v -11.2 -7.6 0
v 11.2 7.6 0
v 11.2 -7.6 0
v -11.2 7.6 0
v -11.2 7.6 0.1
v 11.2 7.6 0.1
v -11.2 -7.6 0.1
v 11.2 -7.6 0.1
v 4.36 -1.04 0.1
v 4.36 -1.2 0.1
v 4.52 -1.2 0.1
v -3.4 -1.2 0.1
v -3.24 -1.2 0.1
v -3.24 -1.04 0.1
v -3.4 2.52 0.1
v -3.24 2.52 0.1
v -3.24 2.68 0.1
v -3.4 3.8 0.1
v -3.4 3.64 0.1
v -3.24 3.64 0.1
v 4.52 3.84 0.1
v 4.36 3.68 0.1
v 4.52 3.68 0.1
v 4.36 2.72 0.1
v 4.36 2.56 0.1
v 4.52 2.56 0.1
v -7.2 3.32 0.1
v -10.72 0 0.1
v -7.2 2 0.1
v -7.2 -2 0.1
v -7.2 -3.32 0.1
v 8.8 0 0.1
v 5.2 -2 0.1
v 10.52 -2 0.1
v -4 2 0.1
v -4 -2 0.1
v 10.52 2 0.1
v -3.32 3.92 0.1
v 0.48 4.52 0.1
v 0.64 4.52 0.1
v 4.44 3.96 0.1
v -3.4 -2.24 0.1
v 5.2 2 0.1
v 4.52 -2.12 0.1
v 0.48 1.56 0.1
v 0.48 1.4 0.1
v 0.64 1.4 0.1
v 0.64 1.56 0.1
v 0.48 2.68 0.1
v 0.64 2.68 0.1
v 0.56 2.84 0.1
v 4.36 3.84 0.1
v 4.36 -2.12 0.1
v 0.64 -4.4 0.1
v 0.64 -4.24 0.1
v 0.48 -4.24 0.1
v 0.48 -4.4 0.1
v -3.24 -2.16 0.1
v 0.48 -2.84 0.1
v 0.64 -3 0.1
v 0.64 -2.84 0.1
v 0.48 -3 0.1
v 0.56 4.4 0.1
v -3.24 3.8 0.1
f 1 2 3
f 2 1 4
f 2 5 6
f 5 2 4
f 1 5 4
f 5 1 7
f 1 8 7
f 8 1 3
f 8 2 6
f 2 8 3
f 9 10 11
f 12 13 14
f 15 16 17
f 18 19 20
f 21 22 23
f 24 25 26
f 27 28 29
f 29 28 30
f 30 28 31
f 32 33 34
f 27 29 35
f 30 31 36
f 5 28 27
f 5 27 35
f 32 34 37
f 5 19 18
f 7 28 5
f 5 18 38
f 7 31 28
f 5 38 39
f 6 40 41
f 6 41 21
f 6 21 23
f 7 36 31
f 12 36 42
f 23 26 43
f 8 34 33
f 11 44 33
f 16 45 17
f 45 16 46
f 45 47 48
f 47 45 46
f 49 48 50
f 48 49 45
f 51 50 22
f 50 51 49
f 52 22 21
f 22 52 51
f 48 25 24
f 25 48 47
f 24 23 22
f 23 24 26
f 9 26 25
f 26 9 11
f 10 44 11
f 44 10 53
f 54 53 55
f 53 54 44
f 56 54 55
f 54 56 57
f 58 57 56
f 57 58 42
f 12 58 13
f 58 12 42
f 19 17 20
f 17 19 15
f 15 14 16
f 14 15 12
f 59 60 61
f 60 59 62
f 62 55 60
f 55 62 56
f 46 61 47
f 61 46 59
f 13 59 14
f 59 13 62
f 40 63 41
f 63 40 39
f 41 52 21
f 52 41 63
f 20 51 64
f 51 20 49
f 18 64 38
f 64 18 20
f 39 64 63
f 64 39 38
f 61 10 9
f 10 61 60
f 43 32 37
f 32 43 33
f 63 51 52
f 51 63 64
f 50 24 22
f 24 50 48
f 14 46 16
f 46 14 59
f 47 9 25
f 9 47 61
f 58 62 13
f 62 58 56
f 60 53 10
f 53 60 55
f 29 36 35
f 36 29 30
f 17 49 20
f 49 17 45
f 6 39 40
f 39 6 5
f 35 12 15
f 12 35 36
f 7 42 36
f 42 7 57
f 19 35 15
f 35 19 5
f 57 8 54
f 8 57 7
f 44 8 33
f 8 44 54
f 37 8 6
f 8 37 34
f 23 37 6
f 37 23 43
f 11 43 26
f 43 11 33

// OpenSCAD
// file: ../p/4-4edge.scad
use <../lib.scad>
$fa=1; $fs=0.2;
function ldraw_lib__4_4edge(realsolid=false) = [
// 0 Circle 1.0
// 0 Name: 4-4edge.dat
// 0 Author: James Jessiman
// 0 !LDRAW_ORG Primitive UPDATE 2017-01
// 0 !LICENSE Licensed under CC BY 2.0 and CC BY 4.0 : see CAreadme.txt
// 
// 0 BFC CERTIFY CCW
  [0,"BFC","CERTIFY"],
  [0,"BFC","CCW"],
// 
// 0 !HISTORY 1998-12-15 [PTadmin] Official Update 1998-10
// 0 !HISTORY 2005-12-28 [PTadmin] Official Update 2005-01
// 0 !HISTORY 2007-06-24 [PTadmin] Header formatted for Contributor Agreement
// 0 !HISTORY 2008-07-01 [PTadmin] Official Update 2008-01
// 0 !HISTORY 2017-01-15 [Steffen] BFCed
// 0 !HISTORY 2017-12-30 [PTadmin] Official Update 2017-01
// 
// 
// 2 24 1 0 0 0.9239 0 0.3827
  [2,24,1,0,0,0.9239,0,0.3827],
// 2 24 0.9239 0 0.3827 0.7071 0 0.7071
  [2,24,0.9239,0,0.3827,0.7071,0,0.7071],
// 2 24 0.7071 0 0.7071 0.3827 0 0.9239
  [2,24,0.7071,0,0.7071,0.3827,0,0.9239],
// 2 24 0.3827 0 0.9239 0 0 1
  [2,24,0.3827,0,0.9239,0,0,1],
// 2 24 0 0 1 -0.3827 0 0.9239
  [2,24,0,0,1,-0.3827,0,0.9239],
// 2 24 -0.3827 0 0.9239 -0.7071 0 0.7071
  [2,24,-0.3827,0,0.9239,-0.7071,0,0.7071],
// 2 24 -0.7071 0 0.7071 -0.9239 0 0.3827
  [2,24,-0.7071,0,0.7071,-0.9239,0,0.3827],
// 2 24 -0.9239 0 0.3827 -1 0 -0
  [2,24,-0.9239,0,0.3827,-1,0,-0],
// 2 24 -1 0 -0 -0.9239 0 -0.3827
  [2,24,-1,0,-0,-0.9239,0,-0.3827],
// 2 24 -0.9239 0 -0.3827 -0.7071 0 -0.7071
  [2,24,-0.9239,0,-0.3827,-0.7071,0,-0.7071],
// 2 24 -0.7071 0 -0.7071 -0.3827 0 -0.9239
  [2,24,-0.7071,0,-0.7071,-0.3827,0,-0.9239],
// 2 24 -0.3827 0 -0.9239 0 0 -1
  [2,24,-0.3827,0,-0.9239,0,0,-1],
// 2 24 0 0 -1 0.3827 0 -0.9239
  [2,24,0,0,-1,0.3827,0,-0.9239],
// 2 24 0.3827 0 -0.9239 0.7071 0 -0.7071
  [2,24,0.3827,0,-0.9239,0.7071,0,-0.7071],
// 2 24 0.7071 0 -0.7071 0.9239 0 -0.3827
  [2,24,0.7071,0,-0.7071,0.9239,0,-0.3827],
// 2 24 0.9239 0 -0.3827 1 0 0
  [2,24,0.9239,0,-0.3827,1,0,0],
];
module ldraw_lib__4_4edge(step=0, col=false, unit=2/5, alt=false, line=0.2, solid=!$preview)
    makepoly(ldraw_lib__4_4edge(solid), step=step, col=col, unit=unit, alt=alt, line=line, solid=solid);
ldraw_lib__4_4edge(line=0.2);
// file: ../p/4-4disc.scad
use <../lib.scad>
$fa=1; $fs=0.2;
function ldraw_lib__4_4disc(realsolid=false) = [
// 0 Disc 1.0
// 0 Name: 4-4disc.dat
// 0 Author: James Jessiman
// 0 !LDRAW_ORG Primitive UPDATE 2002-02
// 0 !LICENSE Licensed under CC BY 2.0 and CC BY 4.0 : see CAreadme.txt
// 
// 0 BFC CERTIFY CCW
  [0,"BFC","CERTIFY"],
  [0,"BFC","CCW"],
// 
// 0 !HISTORY 1998-12-15 [PTadmin] Official Update 1998-10
// 0 !HISTORY 2002-03-23 [sbliss] Added BFC statement
// 0 !HISTORY 2002-04-25 [PTadmin] Official Update 2002-02
// 0 !HISTORY 2007-06-24 [PTadmin] Header formatted for Contributor Agreement
// 0 !HISTORY 2008-07-01 [PTadmin] Official Update 2008-01
// 
// 
// 3 16 0 0 0 1 0 0 0.9239 0 0.3827
  [3,16,0,0,0,1,0,0,0.9239,0,0.3827],
// 3 16 0 0 0 0.9239 0 0.3827 0.7071 0 0.7071
  [3,16,0,0,0,0.9239,0,0.3827,0.7071,0,0.7071],
// 3 16 0 0 0 0.7071 0 0.7071 0.3827 0 0.9239
  [3,16,0,0,0,0.7071,0,0.7071,0.3827,0,0.9239],
// 3 16 0 0 0 0.3827 0 0.9239 0 0 1
  [3,16,0,0,0,0.3827,0,0.9239,0,0,1],
// 3 16 0 0 0 0 0 1 -0.3827 0 0.9239
  [3,16,0,0,0,0,0,1,-0.3827,0,0.9239],
// 3 16 0 0 0 -0.3827 0 0.9239 -0.7071 0 0.7071
  [3,16,0,0,0,-0.3827,0,0.9239,-0.7071,0,0.7071],
// 3 16 0 0 0 -0.7071 0 0.7071 -0.9239 0 0.3827
  [3,16,0,0,0,-0.7071,0,0.7071,-0.9239,0,0.3827],
// 3 16 0 0 0 -0.9239 0 0.3827 -1 0 -0
  [3,16,0,0,0,-0.9239,0,0.3827,-1,0,-0],
// 3 16 0 0 0 -1 0 -0 -0.9239 0 -0.3827
  [3,16,0,0,0,-1,0,-0,-0.9239,0,-0.3827],
// 3 16 0 0 0 -0.9239 0 -0.3827 -0.7071 0 -0.7071
  [3,16,0,0,0,-0.9239,0,-0.3827,-0.7071,0,-0.7071],
// 3 16 0 0 0 -0.7071 0 -0.7071 -0.3827 0 -0.9239
  [3,16,0,0,0,-0.7071,0,-0.7071,-0.3827,0,-0.9239],
// 3 16 0 0 0 -0.3827 0 -0.9239 0 0 -1
  [3,16,0,0,0,-0.3827,0,-0.9239,0,0,-1],
// 3 16 0 0 0 0 0 -1 0.3827 0 -0.9239
  [3,16,0,0,0,0,0,-1,0.3827,0,-0.9239],
// 3 16 0 0 0 0.3827 0 -0.9239 0.7071 0 -0.7071
  [3,16,0,0,0,0.3827,0,-0.9239,0.7071,0,-0.7071],
// 3 16 0 0 0 0.7071 0 -0.7071 0.9239 0 -0.3827
  [3,16,0,0,0,0.7071,0,-0.7071,0.9239,0,-0.3827],
// 3 16 0 0 0 0.9239 0 -0.3827 1 0 0
  [3,16,0,0,0,0.9239,0,-0.3827,1,0,0],
// 0
];
module ldraw_lib__4_4disc(step=0, col=false, unit=2/5, alt=false, line=0.2, solid=!$preview)
    makepoly(ldraw_lib__4_4disc(solid), step=step, col=col, unit=unit, alt=alt, line=line, solid=solid);
ldraw_lib__4_4disc(line=0.2);
// file: ../p/4-4cyli.scad
use <../lib.scad>
$fa=1; $fs=0.2;
function ldraw_lib__4_4cyli(realsolid=false) = [
// 0 Cylinder 1.0
// 0 Name: 4-4cyli.dat
// 0 Author: James Jessiman
// 0 !LDRAW_ORG Primitive UPDATE 2005-01
// 0 !LICENSE Licensed under CC BY 2.0 and CC BY 4.0 : see CAreadme.txt
// 
// 0 BFC CERTIFY CCW
  [0,"BFC","CERTIFY"],
  [0,"BFC","CCW"],
// 
// 0 !HISTORY 1998-12-15 [PTadmin] Official Update 1998-10
// 0 !HISTORY 2002-03-23 [sbliss] Added BFC statement; merged headers from files in distributions LDraw 0.27 and Complete.
// 0 !HISTORY 2002-04-25 [PTadmin] Official Update 2002-02
// 0 !HISTORY 2004-12-14 [guyvivan] BFC CCW
// 0 !HISTORY 2005-12-28 [PTadmin] Official Update 2005-01
// 0 !HISTORY 2007-06-24 [PTadmin] Header formatted for Contributor Agreement
// 0 !HISTORY 2008-07-01 [PTadmin] Official Update 2008-01
// 
// 
// 4 16 1 1 0 0.9239 1 0.3827 0.9239 0 0.3827 1 0 0
  [4,16,1,1,0,0.9239,1,0.3827,0.9239,0,0.3827,1,0,0],
// 5 24 1 0 0 1 1 0 0.9239 0 0.3827 0.9239 0 -0.3827
  [5,24,1,0,0,1,1,0,0.9239,0,0.3827,0.9239,0,-0.3827],
// 4 16 0.9239 1 0.3827 0.7071 1 0.7071 0.7071 0 0.7071 0.9239 0 0.3827
  [4,16,0.9239,1,0.3827,0.7071,1,0.7071,0.7071,0,0.7071,0.9239,0,0.3827],
// 5 24 0.9239 0 0.3827 0.9239 1 0.3827 0.7071 0 0.7071 1 0 0
  [5,24,0.9239,0,0.3827,0.9239,1,0.3827,0.7071,0,0.7071,1,0,0],
// 4 16 0.7071 1 0.7071 0.3827 1 0.9239 0.3827 0 0.9239 0.7071 0 0.7071
  [4,16,0.7071,1,0.7071,0.3827,1,0.9239,0.3827,0,0.9239,0.7071,0,0.7071],
// 5 24 0.7071 0 0.7071 0.7071 1 0.7071 0.3827 0 0.9239 0.9239 0 0.3827
  [5,24,0.7071,0,0.7071,0.7071,1,0.7071,0.3827,0,0.9239,0.9239,0,0.3827],
// 4 16 0.3827 1 0.9239 0 1 1 0 0 1 0.3827 0 0.9239
  [4,16,0.3827,1,0.9239,0,1,1,0,0,1,0.3827,0,0.9239],
// 5 24 0.3827 0 0.9239 0.3827 1 0.9239 0 0 1 0.7071 0 0.7071
  [5,24,0.3827,0,0.9239,0.3827,1,0.9239,0,0,1,0.7071,0,0.7071],
// 4 16 0 1 1 -0.3827 1 0.9239 -0.3827 0 0.9239 0 0 1
  [4,16,0,1,1,-0.3827,1,0.9239,-0.3827,0,0.9239,0,0,1],
// 5 24 0 0 1 0 1 1 -0.3827 0 0.9239 0.3827 0 0.9239
  [5,24,0,0,1,0,1,1,-0.3827,0,0.9239,0.3827,0,0.9239],
// 4 16 -0.3827 1 0.9239 -0.7071 1 0.7071 -0.7071 0 0.7071 -0.3827 0 0.9239
  [4,16,-0.3827,1,0.9239,-0.7071,1,0.7071,-0.7071,0,0.7071,-0.3827,0,0.9239],
// 5 24 -0.3827 0 0.9239 -0.3827 1 0.9239 -0.7071 0 0.7071 0 0 1
  [5,24,-0.3827,0,0.9239,-0.3827,1,0.9239,-0.7071,0,0.7071,0,0,1],
// 4 16 -0.7071 1 0.7071 -0.9239 1 0.3827 -0.9239 0 0.3827 -0.7071 0 0.7071
  [4,16,-0.7071,1,0.7071,-0.9239,1,0.3827,-0.9239,0,0.3827,-0.7071,0,0.7071],
// 5 24 -0.7071 0 0.7071 -0.7071 1 0.7071 -0.9239 0 0.3827 -0.3827 0 0.9239
  [5,24,-0.7071,0,0.7071,-0.7071,1,0.7071,-0.9239,0,0.3827,-0.3827,0,0.9239],
// 4 16 -0.9239 1 0.3827 -1 1 0 -1 0 0 -0.9239 0 0.3827
  [4,16,-0.9239,1,0.3827,-1,1,0,-1,0,0,-0.9239,0,0.3827],
// 5 24 -0.9239 0 0.3827 -0.9239 1 0.3827 -1 0 0 -0.7071 0 0.7071
  [5,24,-0.9239,0,0.3827,-0.9239,1,0.3827,-1,0,0,-0.7071,0,0.7071],
// 4 16 -1 1 0 -0.9239 1 -0.3827 -0.9239 0 -0.3827 -1 0 0
  [4,16,-1,1,0,-0.9239,1,-0.3827,-0.9239,0,-0.3827,-1,0,0],
// 5 24 -1 0 0 -1 1 0 -0.9239 0 -0.3827 -0.9239 0 0.3827
  [5,24,-1,0,0,-1,1,0,-0.9239,0,-0.3827,-0.9239,0,0.3827],
// 4 16 -0.9239 1 -0.3827 -0.7071 1 -0.7071 -0.7071 0 -0.7071 -0.9239 0 -0.3827
  [4,16,-0.9239,1,-0.3827,-0.7071,1,-0.7071,-0.7071,0,-0.7071,-0.9239,0,-0.3827],
// 5 24 -0.9239 0 -0.3827 -0.9239 1 -0.3827 -0.7071 0 -0.7071 -1 0 0
  [5,24,-0.9239,0,-0.3827,-0.9239,1,-0.3827,-0.7071,0,-0.7071,-1,0,0],
// 4 16 -0.7071 1 -0.7071 -0.3827 1 -0.9239 -0.3827 0 -0.9239 -0.7071 0 -0.7071
  [4,16,-0.7071,1,-0.7071,-0.3827,1,-0.9239,-0.3827,0,-0.9239,-0.7071,0,-0.7071],
// 5 24 -0.7071 0 -0.7071 -0.7071 1 -0.7071 -0.3827 0 -0.9239 -0.9239 0 -0.3827
  [5,24,-0.7071,0,-0.7071,-0.7071,1,-0.7071,-0.3827,0,-0.9239,-0.9239,0,-0.3827],
// 4 16 -0.3827 1 -0.9239 0 1 -1 0 0 -1 -0.3827 0 -0.9239
  [4,16,-0.3827,1,-0.9239,0,1,-1,0,0,-1,-0.3827,0,-0.9239],
// 5 24 -0.3827 0 -0.9239 -0.3827 1 -0.9239 0 0 -1 -0.7071 0 -0.7071
  [5,24,-0.3827,0,-0.9239,-0.3827,1,-0.9239,0,0,-1,-0.7071,0,-0.7071],
// 4 16 0 1 -1 0.3827 1 -0.9239 0.3827 0 -0.9239 0 0 -1
  [4,16,0,1,-1,0.3827,1,-0.9239,0.3827,0,-0.9239,0,0,-1],
// 5 24 0 0 -1 0 1 -1 0.3827 0 -0.9239 -0.3827 0 -0.9239
  [5,24,0,0,-1,0,1,-1,0.3827,0,-0.9239,-0.3827,0,-0.9239],
// 4 16 0.3827 1 -0.9239 0.7071 1 -0.7071 0.7071 0 -0.7071 0.3827 0 -0.9239
  [4,16,0.3827,1,-0.9239,0.7071,1,-0.7071,0.7071,0,-0.7071,0.3827,0,-0.9239],
// 5 24 0.3827 0 -0.9239 0.3827 1 -0.9239 0.7071 0 -0.7071 0 0 -1
  [5,24,0.3827,0,-0.9239,0.3827,1,-0.9239,0.7071,0,-0.7071,0,0,-1],
// 4 16 0.7071 1 -0.7071 0.9239 1 -0.3827 0.9239 0 -0.3827 0.7071 0 -0.7071
  [4,16,0.7071,1,-0.7071,0.9239,1,-0.3827,0.9239,0,-0.3827,0.7071,0,-0.7071],
// 5 24 0.7071 0 -0.7071 0.7071 1 -0.7071 0.9239 0 -0.3827 0.3827 0 -0.9239
  [5,24,0.7071,0,-0.7071,0.7071,1,-0.7071,0.9239,0,-0.3827,0.3827,0,-0.9239],
// 4 16 0.9239 1 -0.3827 1 1 0 1 0 0 0.9239 0 -0.3827
  [4,16,0.9239,1,-0.3827,1,1,0,1,0,0,0.9239,0,-0.3827],
// 5 24 0.9239 0 -0.3827 0.9239 1 -0.3827 1 0 0 0.7071 0 -0.7071
  [5,24,0.9239,0,-0.3827,0.9239,1,-0.3827,1,0,0,0.7071,0,-0.7071],
// 0
];
module ldraw_lib__4_4cyli(step=0, col=false, unit=2/5, alt=false, line=0.2, solid=!$preview)
    makepoly(ldraw_lib__4_4cyli(solid), step=step, col=col, unit=unit, alt=alt, line=line, solid=solid);
ldraw_lib__4_4cyli(line=0.2);
// file: ../p/stud3.scad
use <../lib.scad>
use <4-4cyli.scad>
use <4-4disc.scad>
use <4-4edge.scad>
$fa=1; $fs=0.2;
function ldraw_lib__stud3(realsolid=false) = realsolid ? 
    [openscad(translate([0,0,-eps()], o=cylinder(4+eps(), r=4)),2)] : [
// 0 Stud Tube Solid
// 0 Name: stud3.dat
// 0 Author: James Jessiman
// 0 !LDRAW_ORG Primitive UPDATE 2012-01
// 0 !LICENSE Licensed under CC BY 2.0 and CC BY 4.0 : see CAreadme.txt
// 
// 0 BFC CERTIFY CCW
  [0,"BFC","CERTIFY"],
  [0,"BFC","CCW"],
// 
// 0 !HISTORY 2002-04-04 [sbliss] Modified for BFC compliance
// 0 !HISTORY 2002-04-25 [PTadmin] Official Update 2002-02
// 0 !HISTORY 2007-06-24 [PTadmin] Header formatted for Contributor Agreement
// 0 !HISTORY 2008-07-01 [PTadmin] Official Update 2008-01
// 0 !HISTORY 2012-02-16 [Philo] Changed to CCW
// 0 !HISTORY 2012-03-30 [PTadmin] Official Update 2012-01
// 
// 
// 1 16 0 -4 0 4 0 0 0 1 0 0 0 4 4-4edge.dat
  [1,16,0,-4,0,4,0,0,0,1,0,0,0,4, ldraw_lib__4_4edge(realsolid)],
// 1 16 0 0 0 4 0 0 0 1 0 0 0 4 4-4edge.dat
  [1,16,0,0,0,4,0,0,0,1,0,0,0,4, ldraw_lib__4_4edge(realsolid)],
// 1 16 0 -4 0 4 0 0 0 1 0 0 0 4 4-4disc.dat
  [1,16,0,-4,0,4,0,0,0,1,0,0,0,4, ldraw_lib__4_4disc(realsolid)],
// 1 16 0 -4 0 4 0 0 0 4 0 0 0 4 4-4cyli.dat
  [1,16,0,-4,0,4,0,0,0,4,0,0,0,4, ldraw_lib__4_4cyli(realsolid)],
];
module ldraw_lib__stud3(step=0, col=false, unit=2/5, alt=false, line=0.2, solid=!$preview)
    makepoly(ldraw_lib__stud3(solid), step=step, col=col, unit=unit, alt=alt, line=line, solid=solid);
ldraw_lib__stud3(line=0.2);
// file: ../p/stud.scad
use <../lib.scad>
use <4-4cyli.scad>
use <4-4disc.scad>
use <4-4edge.scad>
$fa=1; $fs=0.2;
function ldraw_lib__stud(realsolid=false) = realsolid ? 
    [openscad(translate([0,0,-eps()], o=cylinder(4+eps(), r=6)),2)] : [
// 0 Stud
// 0 Name: stud.dat
// 0 Author: James Jessiman
// 0 !LDRAW_ORG Primitive UPDATE 2012-01
// 0 !LICENSE Licensed under CC BY 2.0 and CC BY 4.0 : see CAreadme.txt
// 
// 0 BFC CERTIFY CCW
  [0,"BFC","CERTIFY"],
  [0,"BFC","CCW"],
// 
// 0 !HISTORY 2002-04-04 [sbliss] Modified for BFC compliance
// 0 !HISTORY 2002-04-25 [PTadmin] Official Update 2002-02
// 0 !HISTORY 2007-06-24 [PTadmin] Header formatted for Contributor Agreement
// 0 !HISTORY 2008-07-01 [PTadmin] Official Update 2008-01
// 0 !HISTORY 2012-02-16 [Philo] Changed to CCW
// 0 !HISTORY 2012-03-30 [PTadmin] Official Update 2012-01
// 
// 
// 1 16 0 0 0 6 0 0 0 1 0 0 0 6 4-4edge.dat
  [1,16,0,0,0,6,0,0,0,1,0,0,0,6, ldraw_lib__4_4edge(realsolid)],
// 1 16 0 -4 0 6 0 0 0 1 0 0 0 6 4-4edge.dat
  [1,16,0,-4,0,6,0,0,0,1,0,0,0,6, ldraw_lib__4_4edge(realsolid)],
// 1 16 0 0 0 6 0 0 0 -4 0 0 0 6 4-4cyli.dat
  [1,16,0,0,0,6,0,0,0,-4,0,0,0,6, ldraw_lib__4_4cyli(realsolid)],
// 1 16 0 -4 0 6 0 0 0 1 0 0 0 6 4-4disc.dat
  [1,16,0,-4,0,6,0,0,0,1,0,0,0,6, ldraw_lib__4_4disc(realsolid)],
];
module ldraw_lib__stud(step=0, col=false, unit=2/5, alt=false, line=0.2, solid=!$preview)
    makepoly(ldraw_lib__stud(solid), step=step, col=col, unit=unit, alt=alt, line=line, solid=solid);
ldraw_lib__stud(line=0.2);
// file: ../p/box5.scad
use <../lib.scad>
$fa=1; $fs=0.2;
function ldraw_lib__box5(realsolid=false) = [
// 0 Box with 5 Faces and All Edges
// 0 Name: box5.dat
// 0 Author: James Jessiman
// 0 !LDRAW_ORG Primitive UPDATE 2012-01
// 0 !LICENSE Licensed under CC BY 2.0 and CC BY 4.0 : see CAreadme.txt
// 
// 0 BFC CERTIFY CCW
  [0,"BFC","CERTIFY"],
  [0,"BFC","CCW"],
// 
// 0 !HISTORY 2002-04-03 [sbliss] Modified for BFC compliance
// 0 !HISTORY 2002-04-25 [PTadmin] Official Update 2002-02
// 0 !HISTORY 2007-06-24 [PTadmin] Header formatted for Contributor Agreement
// 0 !HISTORY 2008-07-01 [PTadmin] Official Update 2008-01
// 0 !HISTORY 2012-02-16 [Philo] Changed to CCW
// 0 !HISTORY 2012-03-30 [PTadmin] Official Update 2012-01
// 
// 
// 2 24 1 1 1 -1 1 1
  [2,24,1,1,1,-1,1,1],
// 2 24 -1 1 1 -1 1 -1
  [2,24,-1,1,1,-1,1,-1],
// 2 24 -1 1 -1 1 1 -1
  [2,24,-1,1,-1,1,1,-1],
// 2 24 1 1 -1 1 1 1
  [2,24,1,1,-1,1,1,1],
// 2 24 1 0 1 -1 0 1
  [2,24,1,0,1,-1,0,1],
// 2 24 -1 0 1 -1 0 -1
  [2,24,-1,0,1,-1,0,-1],
// 2 24 -1 0 -1 1 0 -1
  [2,24,-1,0,-1,1,0,-1],
// 2 24 1 0 -1 1 0 1
  [2,24,1,0,-1,1,0,1],
// 2 24 1 0 1 1 1 1
  [2,24,1,0,1,1,1,1],
// 2 24 -1 0 1 -1 1 1
  [2,24,-1,0,1,-1,1,1],
// 2 24 1 0 -1 1 1 -1
  [2,24,1,0,-1,1,1,-1],
// 2 24 -1 0 -1 -1 1 -1
  [2,24,-1,0,-1,-1,1,-1],
// 4 16 -1 1 1 1 1 1 1 1 -1 -1 1 -1
  [4,16,-1,1,1,1,1,1,1,1,-1,-1,1,-1],
// 4 16 -1 1 1 -1 0 1 1 0 1 1 1 1
  [4,16,-1,1,1,-1,0,1,1,0,1,1,1,1],
// 4 16 -1 1 -1 -1 0 -1 -1 0 1 -1 1 1
  [4,16,-1,1,-1,-1,0,-1,-1,0,1,-1,1,1],
// 4 16 1 1 -1 1 0 -1 -1 0 -1 -1 1 -1
  [4,16,1,1,-1,1,0,-1,-1,0,-1,-1,1,-1],
// 4 16 1 1 1 1 0 1 1 0 -1 1 1 -1
  [4,16,1,1,1,1,0,1,1,0,-1,1,1,-1],
];
module ldraw_lib__box5(step=0, col=false, unit=2/5, alt=false, line=0.2, solid=!$preview)
    makepoly(ldraw_lib__box5(solid), step=step, col=col, unit=unit, alt=alt, line=line, solid=solid);
ldraw_lib__box5(line=0.2);
// file: ../p/box4t.scad
use <../lib.scad>
$fa=1; $fs=0.2;
function ldraw_lib__box4t(realsolid=false) = [
// 0 Box with 4 Adjacent Faces and All Edges
// 0 Name: box4t.dat
// 0 Author: Tore Eriksson [Tore_Eriksson]
// 0 !LDRAW_ORG Primitive UPDATE 2003-02
// 0 !LICENSE Licensed under CC BY 2.0 and CC BY 4.0 : see CAreadme.txt
// 
// 0 BFC CERTIFY CCW
  [0,"BFC","CERTIFY"],
  [0,"BFC","CCW"],
// 
// 0 !HISTORY 1997-09-29 [PTadmin] Official Update 1997-15
// 0 !HISTORY 2002-08-31 [izanette] Modified with WINDZ for BFC compliance
// 0 !HISTORY 2003-08-01 [PTadmin] Official Update 2003-02
// 0 !HISTORY 2007-06-24 [PTadmin] Header formatted for Contributor Agreement
// 0 !HISTORY 2008-07-01 [PTadmin] Official Update 2008-01
// 
// 
// 2 24 1 1 1 -1 1 1
  [2,24,1,1,1,-1,1,1],
// 2 24 -1 1 1 -1 1 -1
  [2,24,-1,1,1,-1,1,-1],
// 2 24 -1 1 -1 1 1 -1
  [2,24,-1,1,-1,1,1,-1],
// 2 24 1 1 -1 1 1 1
  [2,24,1,1,-1,1,1,1],
// 2 24 1 0 1 -1 0 1
  [2,24,1,0,1,-1,0,1],
// 2 24 -1 0 1 -1 0 -1
  [2,24,-1,0,1,-1,0,-1],
// 2 24 -1 0 -1 1 0 -1
  [2,24,-1,0,-1,1,0,-1],
// 2 24 1 0 -1 1 0 1
  [2,24,1,0,-1,1,0,1],
// 2 24 1 0 1 1 1 1
  [2,24,1,0,1,1,1,1],
// 2 24 -1 0 1 -1 1 1
  [2,24,-1,0,1,-1,1,1],
// 2 24 1 0 -1 1 1 -1
  [2,24,1,0,-1,1,1,-1],
// 2 24 -1 0 -1 -1 1 -1
  [2,24,-1,0,-1,-1,1,-1],
// 4 16 1 1 1 1 1 -1 -1 1 -1 -1 1 1
  [4,16,1,1,1,1,1,-1,-1,1,-1,-1,1,1],
// 4 16 1 1 1 -1 1 1 -1 0 1 1 0 1
  [4,16,1,1,1,-1,1,1,-1,0,1,1,0,1],
// 4 16 -1 1 1 -1 1 -1 -1 0 -1 -1 0 1
  [4,16,-1,1,1,-1,1,-1,-1,0,-1,-1,0,1],
// 0 4 16 -1 1 -1 -1 0 -1 1 0 -1 1 1 -1
// 4 16 1 1 -1 1 1 1 1 0 1 1 0 -1
  [4,16,1,1,-1,1,1,1,1,0,1,1,0,-1],
// 0
];
module ldraw_lib__box4t(step=0, col=false, unit=2/5, alt=false, line=0.2, solid=!$preview)
    makepoly(ldraw_lib__box4t(solid), step=step, col=col, unit=unit, alt=alt, line=line, solid=solid);
ldraw_lib__box4t(line=0.2);
// file: s/3004s01.scad
use <../../lib.scad>
use <../../p/box4t.scad>
use <../../p/box5.scad>
use <../../p/stud.scad>
use <../../p/stud3.scad>
$fa=1; $fs=0.2;
function ldraw_lib__s__3004s01(realsolid=false) = [
// 0 ~Brick  1 x  2 without Front Face
// 0 Name: s\3004s01.dat
// 0 Author: James Jessiman
// 0 !LDRAW_ORG Subpart UPDATE 2003-03
// 0 !LICENSE Licensed under CC BY 2.0 and CC BY 4.0 : see CAreadme.txt
// 
// 0 BFC CERTIFY CCW
  [0,"BFC","CERTIFY"],
  [0,"BFC","CCW"],
// 
// 0 !HISTORY 2003-09-07 [jriley] Subfiling, BFC
// 0 !HISTORY 2003-12-19 [PTadmin] Official Update 2003-03
// 0 !HISTORY 2007-08-29 [PTadmin] Header formatted for Contributor Agreement
// 0 !HISTORY 2008-07-01 [PTadmin] Official Update 2008-01
// 
// 
// 1 16 0 4 0 1 0 0 0 -5 0 0 0 1 stud3.dat
  [1,16,0,4,0,1,0,0,0,-5,0,0,0,1, ldraw_lib__stud3(realsolid)],
// 0 BFC INVERTNEXT
  [0,"BFC","INVERTNEXT"],
// 1 16 0 24 0 16 0 0 0 -20 0 0 0 6 box5.dat
  [1,16,0,24,0,16,0,0,0,-20,0,0,0,6, ldraw_lib__box5(realsolid)],
// 4 16 20 24 10 16 24 6 -16 24 6 -20 24 10
  [4,16,20,24,10,16,24,6,-16,24,6,-20,24,10],
// 4 16 -20 24 10 -16 24 6 -16 24 -6 -20 24 -10
  [4,16,-20,24,10,-16,24,6,-16,24,-6,-20,24,-10],
// 4 16 -20 24 -10 -16 24 -6 16 24 -6 20 24 -10
  [4,16,-20,24,-10,-16,24,-6,16,24,-6,20,24,-10],
// 4 16 20 24 -10 16 24 -6 16 24 6 20 24 10
  [4,16,20,24,-10,16,24,-6,16,24,6,20,24,10],
// 1 16 0 24 0 20 0 0 0 -24 0 0 0 10 box4t.dat
  [1,16,0,24,0,20,0,0,0,-24,0,0,0,10, ldraw_lib__box4t(realsolid)],
// 1 16 10 0 0 1 0 0 0 1 0 0 0 1 stud.dat
  [1,16,10,0,0,1,0,0,0,1,0,0,0,1, ldraw_lib__stud(realsolid)],
// 1 16 -10 0 0 1 0 0 0 1 0 0 0 1 stud.dat
  [1,16,-10,0,0,1,0,0,0,1,0,0,0,1, ldraw_lib__stud(realsolid)],
// 0
];
module ldraw_lib__s__3004s01(step=0, col=false, unit=2/5, alt=false, line=0.2, solid=!$preview)
    makepoly(ldraw_lib__s__3004s01(solid), step=step, col=col, unit=unit, alt=alt, line=line, solid=solid);
ldraw_lib__s__3004s01(line=0.2);
// file: 3004.scad
use <../lib.scad>
use <s/3004s01.scad>
$fa=1; $fs=0.2;
function ldraw_lib__3004(realsolid=false) = [
// 0 Brick  1 x  2
// 0 Name: 3004.dat
// 0 Author: James Jessiman
// 0 !LDRAW_ORG Part UPDATE 2022-05
// 0 !LICENSE Licensed under CC BY 2.0 and CC BY 4.0 : see CAreadme.txt
// 
// 0 BFC CERTIFY CCW
  [0,"BFC","CERTIFY"],
  [0,"BFC","CCW"],
// 
// 0 !HISTORY 2001-10-26 [PTadmin] Official Update 2001-01
// 0 !HISTORY 2002-05-07 {unknown} BFC Certification
// 0 !HISTORY 2002-06-11 [PTadmin] Official Update 2002-03
// 0 !HISTORY 2007-05-07 [PTadmin] Header formatted for Contributor Agreement
// 0 !HISTORY 2008-07-01 [PTadmin] Official Update 2008-01
// 0 !HISTORY 2022-08-04 [MagFors] Using subfile
// 0 !HISTORY 2022-09-15 [PTadmin] Official Update 2022-05
// 
// 
// 1 16 0 0 0 1 0 0 0 1 0 0 0 1 s\3004s01.dat
  [1,16,0,0,0,1,0,0,0,1,0,0,0,1, ldraw_lib__s__3004s01(realsolid)],
// 4 16 -20 24 -10 20 24 -10 20 0 -10 -20 0 -10
  [4,16,-20,24,-10,20,24,-10,20,0,-10,-20,0,-10],
];
module ldraw_lib__3004(step=0, col=false, unit=2/5, alt=false, line=0.2, solid=!$preview)
    makepoly(ldraw_lib__3004(solid), step=step, col=col, unit=unit, alt=alt, line=line, solid=solid);
ldraw_lib__3004(line=0.2);
// file: ../p/box5-12.scad
use <../lib.scad>
$fa=1; $fs=0.2;
function ldraw_lib__box5_12(realsolid=false) = [
// 0 Box with 5 Faces without Any Edges
// 0 Name: box5-12.dat
// 0 Author: Chris Dee [cwdee]
// 0 !LDRAW_ORG Primitive UPDATE 2009-02
// 0 !LICENSE Licensed under CC BY 2.0 and CC BY 4.0 : see CAreadme.txt
// 
// 0 BFC CERTIFY CCW
  [0,"BFC","CERTIFY"],
  [0,"BFC","CCW"],
// 
// 0 !HISTORY 2009-09-03 [PTadmin] Official Update 2009-02
// 
// 
// 4 16 1 1 1 1 1 -1 -1 1 -1 -1 1 1
  [4,16,1,1,1,1,1,-1,-1,1,-1,-1,1,1],
// 4 16 -1 0 1 1 0 1 1 1 1 -1 1 1
  [4,16,-1,0,1,1,0,1,1,1,1,-1,1,1],
// 4 16 -1 0 -1 -1 0 1 -1 1 1 -1 1 -1
  [4,16,-1,0,-1,-1,0,1,-1,1,1,-1,1,-1],
// 4 16 1 0 -1 -1 0 -1 -1 1 -1 1 1 -1
  [4,16,1,0,-1,-1,0,-1,-1,1,-1,1,1,-1],
// 4 16 1 0 1 1 0 -1 1 1 -1 1 1 1
  [4,16,1,0,1,1,0,-1,1,1,-1,1,1,1],
// 0
];
module ldraw_lib__box5_12(step=0, col=false, unit=2/5, alt=false, line=0.2, solid=!$preview)
    makepoly(ldraw_lib__box5_12(solid), step=step, col=col, unit=unit, alt=alt, line=line, solid=solid);
ldraw_lib__box5_12(line=0.2);
// main file
use <../lib.scad>
use <../p/box5-12.scad>
$fa=1; $fs=0.2;
function ldraw_lib__195075b(realsolid=false) = [
// 0 Sticker  1.9 x  2.8 with Yellow Box and Arrow Left
// 0 Name: 195075b.dat
// 0 Author: Bjoern Sigve Storesund [Storesund]
// 0 !LDRAW_ORG Part UPDATE 2017-01
// 0 !LICENSE Licensed under CC BY 2.0 and CC BY 4.0 : see CAreadme.txt
// 
// 0 BFC CERTIFY CCW
  [0,"BFC","CERTIFY"],
  [0,"BFC","CCW"],
// 
// 0 !KEYWORDS Delivery Van, Set 6624
// 
// 0 !HISTORY 2017-12-30 [PTadmin] Official Update 2017-01
// 
// 
// 1 16 0 -0.25 0 28 0 0 0 0.25 0 0 0 19 box5-12.dat
  [1,16,0,-0.25,0,28,0,0,0,0.25,0,0,0,19, ldraw_lib__box5_12(realsolid)],
// 3 0 10.9 -0.25 -2.6 10.9 -0.25 -3 11.3 -0.25 -3
  [3,0,10.9,-0.25,-2.6,10.9,-0.25,-3,11.3,-0.25,-3],
// 3 0 -8.5 -0.25 -3 -8.1 -0.25 -3 -8.1 -0.25 -2.6
  [3,0,-8.5,-0.25,-3,-8.1,-0.25,-3,-8.1,-0.25,-2.6],
// 3 0 -8.5 -.25 6.3 -8.1 -.25 6.3 -8.1 -0.25 6.7
  [3,0,-8.5,-.25,6.3,-8.1,-.25,6.3,-8.1,-0.25,6.7],
// 3 0 -8.5 -0.25 9.5 -8.5 -0.25 9.1 -8.1 -0.25 9.1
  [3,0,-8.5,-0.25,9.5,-8.5,-0.25,9.1,-8.1,-0.25,9.1],
// 3 0 11.3 -0.25 9.6 10.9 -0.25 9.2 11.3 -0.25 9.2
  [3,0,11.3,-0.25,9.6,10.9,-0.25,9.2,11.3,-0.25,9.2],
// 3 0 10.9 -0.25 6.8 10.9 -0.25 6.4 11.3 -.25 6.4
  [3,0,10.9,-0.25,6.8,10.9,-0.25,6.4,11.3,-.25,6.4],
// 3 14 -18 -.25 8.3 -26.8 -.25 0 -18 -.25 5
  [3,14,-18,-.25,8.3,-26.8,-.25,0,-18,-.25,5],
// 3 14 -18 -.25 5 -26.8 -.25 0 -18 -.25 -5
  [3,14,-18,-.25,5,-26.8,-.25,0,-18,-.25,-5],
// 3 14 -18 -.25 -5 -26.8 -.25 0 -18 -.25 -8.3
  [3,14,-18,-.25,-5,-26.8,-.25,0,-18,-.25,-8.3],
// 3 14 22 -0.25 0 13 -0.25 -5 26.3 -0.25 -5
  [3,14,22,-0.25,0,13,-0.25,-5,26.3,-0.25,-5],
// 3 16 -18 -.25 8.3 -18 -.25 5 -10 -.25 5
  [3,16,-18,-.25,8.3,-18,-.25,5,-10,-.25,5],
// 3 16 -18 -.25 -5 -18 -.25 -8.3 -10 -.25 -5
  [3,16,-18,-.25,-5,-18,-.25,-8.3,-10,-.25,-5],
// 3 16 -28 -.25 19 -26.8 -.25 0 -18 -.25 8.3
  [3,16,-28,-.25,19,-26.8,-.25,0,-18,-.25,8.3],
// 3 16 -28 -.25 19 -18 -.25 8.3 -10 -.25 5
  [3,16,-28,-.25,19,-18,-.25,8.3,-10,-.25,5],
// 3 16 22 -.25 0 26.3 -.25 -5 26.3 -.25 5
  [3,16,22,-.25,0,26.3,-.25,-5,26.3,-.25,5],
// 3 16 -28 -.25 19 -8.5 -.25 9.1 -8.5 -0.25 9.5
  [3,16,-28,-.25,19,-8.5,-.25,9.1,-8.5,-0.25,9.5],
// 3 16 -28 -.25 -19 -26.8 -.25 0 -28 -.25 19
  [3,16,-28,-.25,-19,-26.8,-.25,0,-28,-.25,19],
// 3 16 -28 -.25 19 -8.5 -0.25 9.5 -8.3 -0.25 9.8
  [3,16,-28,-.25,19,-8.5,-0.25,9.5,-8.3,-0.25,9.8],
// 3 16 -28 -.25 -19 -18 -.25 -8.3 -26.8 -.25 0
  [3,16,-28,-.25,-19,-18,-.25,-8.3,-26.8,-.25,0],
// 3 16 -28 -.25 19 -8.3 -0.25 9.8 1.2 -0.25 11.3
  [3,16,-28,-.25,19,-8.3,-0.25,9.8,1.2,-0.25,11.3],
// 3 16 28 -.25 19 1.6 -0.25 11.3 11.1 -0.25 9.9
  [3,16,28,-.25,19,1.6,-0.25,11.3,11.1,-0.25,9.9],
// 3 16 28 -.25 19 11.1 -0.25 9.9 11.3 -0.25 9.6
  [3,16,28,-.25,19,11.1,-0.25,9.9,11.3,-0.25,9.6],
// 3 16 28 -.25 19 11.3 -0.25 9.6 11.3 -0.25 9.2
  [3,16,28,-.25,19,11.3,-0.25,9.6,11.3,-0.25,9.2],
// 3 16 -28 -.25 -19 -10 -.25 -5 -18 -.25 -8.3
  [3,16,-28,-.25,-19,-10,-.25,-5,-18,-.25,-8.3],
// 3 16 -8.5 -.25 -3 -10 -.25 -5 -8.5 -.25 -5.6
  [3,16,-8.5,-.25,-3,-10,-.25,-5,-8.5,-.25,-5.6],
// 3 16 11.3 -.25 9.2 11.3 -.25 6.4 13 -.25 5
  [3,16,11.3,-.25,9.2,11.3,-.25,6.4,13,-.25,5],
// 3 16 28 -.25 -19 26.3 -.25 -5 13 -.25 -5
  [3,16,28,-.25,-19,26.3,-.25,-5,13,-.25,-5],
// 3 16 11.3 -.25 -3 11.3 -.25 -5.3 13 -.25 -5
  [3,16,11.3,-.25,-3,11.3,-.25,-5.3,13,-.25,-5],
// 4 0 -8.1 -0.25 6.7 -8.1 -0.25 6.3 1.2 -0.25 3.5 1.2 -0.25 3.9
  [4,0,-8.1,-0.25,6.7,-8.1,-0.25,6.3,1.2,-0.25,3.5,1.2,-0.25,3.9],
// 4 0 1.2 -0.25 3.9 1.2 -0.25 3.5 1.6 -0.25 3.5 1.6 -0.25 3.9
  [4,0,1.2,-0.25,3.9,1.2,-0.25,3.5,1.6,-0.25,3.5,1.6,-0.25,3.9],
// 4 0 1.2 -0.25 6.7 1.2 -0.25 3.9 1.6 -0.25 3.9 1.6 -0.25 6.7
  [4,0,1.2,-0.25,6.7,1.2,-0.25,3.9,1.6,-0.25,3.9,1.6,-0.25,6.7],
// 4 0 1.4 -0.25 7.1 1.2 -0.25 6.7 1.6 -0.25 6.7 10.9 -0.25 9.2
  [4,0,1.4,-0.25,7.1,1.2,-0.25,6.7,1.6,-0.25,6.7,10.9,-0.25,9.2],
// 4 0 10.9 -0.25 9.6 1.4 -0.25 7.1 10.9 -0.25 9.2 11.3 -0.25 9.6
  [4,0,10.9,-0.25,9.6,1.4,-0.25,7.1,10.9,-0.25,9.2,11.3,-0.25,9.6],
// 4 0 1.6 -0.25 3.9 1.6 -0.25 3.5 10.9 -0.25 6.4 10.9 -0.25 6.8
  [4,0,1.6,-0.25,3.9,1.6,-0.25,3.5,10.9,-0.25,6.4,10.9,-0.25,6.8],
// 4 0 10.9 -0.25 9.2 10.9 -0.25 6.8 11.3 -.25 6.4 11.3 -0.25 9.2
  [4,0,10.9,-0.25,9.2,10.9,-0.25,6.8,11.3,-.25,6.4,11.3,-0.25,9.2],
// 4 0 10.9 -.25 6.4 10.9 -.25 -2.6 11.3 -.25 -3 11.3 -.25 6.4
  [4,0,10.9,-.25,6.4,10.9,-.25,-2.6,11.3,-.25,-3,11.3,-.25,6.4],
// 4 0 11.3 -0.25 -5.3 11.3 -0.25 -3 10.9 -0.25 -3 10.9 -0.25 -5.3
  [4,0,11.3,-0.25,-5.3,11.3,-0.25,-3,10.9,-0.25,-3,10.9,-0.25,-5.3],
// 4 0 1.6 -0.25 -11 11.3 -0.25 -5.3 10.9 -0.25 -5.3 1.6 -0.25 -10.6
  [4,0,1.6,-0.25,-11,11.3,-0.25,-5.3,10.9,-0.25,-5.3,1.6,-0.25,-10.6],
// 4 0 1.6 -0.25 -11 1.6 -0.25 -10.6 1.2 -0.25 -10.6 1.2 -0.25 -11
  [4,0,1.6,-0.25,-11,1.6,-0.25,-10.6,1.2,-0.25,-10.6,1.2,-0.25,-11],
// 4 0 -8.5 -0.25 -5.6 1.2 -0.25 -11 1.2 -0.25 -10.6 -8.1 -0.25 -5.4
  [4,0,-8.5,-0.25,-5.6,1.2,-0.25,-11,1.2,-0.25,-10.6,-8.1,-0.25,-5.4],
// 4 0 -8.5 -0.25 -3 -8.5 -0.25 -5.6 -8.1 -0.25 -5.4 -8.1 -0.25 -3
  [4,0,-8.5,-0.25,-3,-8.5,-0.25,-5.6,-8.1,-0.25,-5.4,-8.1,-0.25,-3],
// 4 0 -8.5 -.25 9.1 -8.5 -.25 6.3 -8.1 -.25 6.7 -8.1 -.25 9.1
  [4,0,-8.5,-.25,9.1,-8.5,-.25,6.3,-8.1,-.25,6.7,-8.1,-.25,9.1],
// 4 0 -8.1 -.25 6.3 -8.5 -.25 6.3 -8.5 -.25 -3 -8.1 -.25 -2.6
  [4,0,-8.1,-.25,6.3,-8.5,-.25,6.3,-8.5,-.25,-3,-8.1,-.25,-2.6],
// 4 0 1.6 -0.25 -7.5 1.6 -0.25 -7.1 1.2 -0.25 -7.1 1.2 -0.25 -7.5
  [4,0,1.6,-0.25,-7.5,1.6,-0.25,-7.1,1.2,-0.25,-7.1,1.2,-0.25,-7.5],
// 4 0 1.6 -0.25 -7.5 1.2 -0.25 -7.5 1.2 -0.25 -10.6 1.6 -0.25 -10.6
  [4,0,1.6,-0.25,-7.5,1.2,-0.25,-7.5,1.2,-0.25,-10.6,1.6,-0.25,-10.6],
// 4 0 1.2 -0.25 -7.1 1.6 -0.25 -7.1 1.6 -0.25 3.5 1.2 -0.25 3.5
  [4,0,1.2,-0.25,-7.1,1.6,-0.25,-7.1,1.6,-0.25,3.5,1.2,-0.25,3.5],
// 4 0 -8.1 -0.25 -2.6 -8.1 -0.25 -3 1.2 -0.25 -7.5 1.2 -0.25 -7.1
  [4,0,-8.1,-0.25,-2.6,-8.1,-0.25,-3,1.2,-0.25,-7.5,1.2,-0.25,-7.1],
// 4 0 1.6 -0.25 11.3 1.2 -0.25 11.3 1.4 -0.25 11 11.1 -0.25 9.9
  [4,0,1.6,-0.25,11.3,1.2,-0.25,11.3,1.4,-0.25,11,11.1,-0.25,9.9],
// 4 0 11.1 -0.25 9.9 1.4 -0.25 11 10.9 -0.25 9.6 11.3 -0.25 9.6
  [4,0,11.1,-0.25,9.9,1.4,-0.25,11,10.9,-0.25,9.6,11.3,-0.25,9.6],
// 4 0 -8.1 -0.25 9.1 1.2 -0.25 6.7 1.4 -0.25 7.1 -8.1 -0.25 9.5
  [4,0,-8.1,-0.25,9.1,1.2,-0.25,6.7,1.4,-0.25,7.1,-8.1,-0.25,9.5],
// 4 0 -8.5 -0.25 9.5 -8.1 -0.25 9.1 -8.1 -0.25 9.5 -8.3 -0.25 9.8
  [4,0,-8.5,-0.25,9.5,-8.1,-0.25,9.1,-8.1,-0.25,9.5,-8.3,-0.25,9.8],
// 4 0 -8.3 -0.25 9.8 -8.1 -0.25 9.5 1.4 -0.25 11 1.2 -0.25 11.3
  [4,0,-8.3,-0.25,9.8,-8.1,-0.25,9.5,1.4,-0.25,11,1.2,-0.25,11.3],
// 4 0 1.6 -0.25 -7.1 1.6 -0.25 -7.5 10.9 -0.25 -3 10.9 -0.25 -2.6
  [4,0,1.6,-0.25,-7.1,1.6,-0.25,-7.5,10.9,-0.25,-3,10.9,-0.25,-2.6],
// 4 14 22 -.25 0 26.3 -.25 5 13 -.25 5 13 -.25 -5
  [4,14,22,-.25,0,26.3,-.25,5,13,-.25,5,13,-.25,-5],
// 4 14 1.4 -0.25 11 -8.1 -0.25 9.5 1.4 -0.25 7.1 10.9 -0.25 9.6
  [4,14,1.4,-0.25,11,-8.1,-0.25,9.5,1.4,-0.25,7.1,10.9,-0.25,9.6],
// 4 14 1.6 -0.25 6.7 1.6 -0.25 3.9 10.9 -0.25 6.8 10.9 -0.25 9.2
  [4,14,1.6,-0.25,6.7,1.6,-0.25,3.9,10.9,-0.25,6.8,10.9,-0.25,9.2],
// 4 14 1.2 -0.25 3.5 -8.1 -0.25 6.3 -8.1 -0.25 -2.6 1.2 -0.25 -7.1
  [4,14,1.2,-0.25,3.5,-8.1,-0.25,6.3,-8.1,-0.25,-2.6,1.2,-0.25,-7.1],
// 4 14 1.6 -0.25 3.5 1.6 -0.25 -7.1 10.9 -0.25 -2.6 10.9 -0.25 6.4
  [4,14,1.6,-0.25,3.5,1.6,-0.25,-7.1,10.9,-0.25,-2.6,10.9,-0.25,6.4],
// 4 14 -8.1 -0.25 -3 -8.1 -0.25 -5.4 1.2 -0.25 -10.6 1.2 -0.25 -7.5
  [4,14,-8.1,-0.25,-3,-8.1,-0.25,-5.4,1.2,-0.25,-10.6,1.2,-0.25,-7.5],
// 4 14 1.6 -0.25 -7.5 1.6 -0.25 -10.6 10.9 -0.25 -5.3 10.9 -0.25 -3
  [4,14,1.6,-0.25,-7.5,1.6,-0.25,-10.6,10.9,-0.25,-5.3,10.9,-0.25,-3],
// 4 14 -18 -.25 5 -18 -.25 -5 -10 -.25 -5 -10 -.25 5
  [4,14,-18,-.25,5,-18,-.25,-5,-10,-.25,-5,-10,-.25,5],
// 4 14 1.2 -0.25 6.7 -8.1 -0.25 9.1 -8.1 -0.25 6.7 1.2 -0.25 3.9
  [4,14,1.2,-0.25,6.7,-8.1,-0.25,9.1,-8.1,-0.25,6.7,1.2,-0.25,3.9],
// 4 16 -28 -.25 19 1.2 -0.25 11.3 1.6 -0.25 11.3 28 -.25 19
  [4,16,-28,-.25,19,1.2,-0.25,11.3,1.6,-0.25,11.3,28,-.25,19],
// 4 16 -10 -.25 5 -10 -.25 -5 -8.5 -.25 -3 -8.5 -.25 6.3
  [4,16,-10,-.25,5,-10,-.25,-5,-8.5,-.25,-3,-8.5,-.25,6.3],
// 4 16 -28 -.25 -19 1.2 -.25 -11 -8.5 -.25 -5.6 -10 -.25 -5
  [4,16,-28,-.25,-19,1.2,-.25,-11,-8.5,-.25,-5.6,-10,-.25,-5],
// 4 16 -28 -.25 19 -10 -.25 5 -8.5 -.25 6.3 -8.5 -.25 9.1
  [4,16,-28,-.25,19,-10,-.25,5,-8.5,-.25,6.3,-8.5,-.25,9.1],
// 4 16 -28 -.25 -19 28 -.25 -19 1.6 -.25 -11 1.2 -.25 -11
  [4,16,-28,-.25,-19,28,-.25,-19,1.6,-.25,-11,1.2,-.25,-11],
// 4 16 28 -.25 -19 13 -.25 -5 11.3 -.25 -5.3 1.6 -.25 -11
  [4,16,28,-.25,-19,13,-.25,-5,11.3,-.25,-5.3,1.6,-.25,-11],
// 4 16 28 -.25 -19 28 -.25 19 26.3 -.25 5 26.3 -.25 -5
  [4,16,28,-.25,-19,28,-.25,19,26.3,-.25,5,26.3,-.25,-5],
// 4 16 28 -.25 19 11.3 -.25 9.2 13 -.25 5 26.3 -.25 5
  [4,16,28,-.25,19,11.3,-.25,9.2,13,-.25,5,26.3,-.25,5],
// 4 16 11.3 -.25 6.4 11.3 -.25 -3 13 -.25 -5 13 -.25 5
  [4,16,11.3,-.25,6.4,11.3,-.25,-3,13,-.25,-5,13,-.25,5],
// 
];
module ldraw_lib__195075b(step=0, col=false, unit=2/5, alt=false, line=0.2, solid=!$preview)
    makepoly(ldraw_lib__195075b(solid), step=step, col=col, unit=unit, alt=alt, line=line, solid=solid);
ldraw_lib__195075b(line=0.2);
